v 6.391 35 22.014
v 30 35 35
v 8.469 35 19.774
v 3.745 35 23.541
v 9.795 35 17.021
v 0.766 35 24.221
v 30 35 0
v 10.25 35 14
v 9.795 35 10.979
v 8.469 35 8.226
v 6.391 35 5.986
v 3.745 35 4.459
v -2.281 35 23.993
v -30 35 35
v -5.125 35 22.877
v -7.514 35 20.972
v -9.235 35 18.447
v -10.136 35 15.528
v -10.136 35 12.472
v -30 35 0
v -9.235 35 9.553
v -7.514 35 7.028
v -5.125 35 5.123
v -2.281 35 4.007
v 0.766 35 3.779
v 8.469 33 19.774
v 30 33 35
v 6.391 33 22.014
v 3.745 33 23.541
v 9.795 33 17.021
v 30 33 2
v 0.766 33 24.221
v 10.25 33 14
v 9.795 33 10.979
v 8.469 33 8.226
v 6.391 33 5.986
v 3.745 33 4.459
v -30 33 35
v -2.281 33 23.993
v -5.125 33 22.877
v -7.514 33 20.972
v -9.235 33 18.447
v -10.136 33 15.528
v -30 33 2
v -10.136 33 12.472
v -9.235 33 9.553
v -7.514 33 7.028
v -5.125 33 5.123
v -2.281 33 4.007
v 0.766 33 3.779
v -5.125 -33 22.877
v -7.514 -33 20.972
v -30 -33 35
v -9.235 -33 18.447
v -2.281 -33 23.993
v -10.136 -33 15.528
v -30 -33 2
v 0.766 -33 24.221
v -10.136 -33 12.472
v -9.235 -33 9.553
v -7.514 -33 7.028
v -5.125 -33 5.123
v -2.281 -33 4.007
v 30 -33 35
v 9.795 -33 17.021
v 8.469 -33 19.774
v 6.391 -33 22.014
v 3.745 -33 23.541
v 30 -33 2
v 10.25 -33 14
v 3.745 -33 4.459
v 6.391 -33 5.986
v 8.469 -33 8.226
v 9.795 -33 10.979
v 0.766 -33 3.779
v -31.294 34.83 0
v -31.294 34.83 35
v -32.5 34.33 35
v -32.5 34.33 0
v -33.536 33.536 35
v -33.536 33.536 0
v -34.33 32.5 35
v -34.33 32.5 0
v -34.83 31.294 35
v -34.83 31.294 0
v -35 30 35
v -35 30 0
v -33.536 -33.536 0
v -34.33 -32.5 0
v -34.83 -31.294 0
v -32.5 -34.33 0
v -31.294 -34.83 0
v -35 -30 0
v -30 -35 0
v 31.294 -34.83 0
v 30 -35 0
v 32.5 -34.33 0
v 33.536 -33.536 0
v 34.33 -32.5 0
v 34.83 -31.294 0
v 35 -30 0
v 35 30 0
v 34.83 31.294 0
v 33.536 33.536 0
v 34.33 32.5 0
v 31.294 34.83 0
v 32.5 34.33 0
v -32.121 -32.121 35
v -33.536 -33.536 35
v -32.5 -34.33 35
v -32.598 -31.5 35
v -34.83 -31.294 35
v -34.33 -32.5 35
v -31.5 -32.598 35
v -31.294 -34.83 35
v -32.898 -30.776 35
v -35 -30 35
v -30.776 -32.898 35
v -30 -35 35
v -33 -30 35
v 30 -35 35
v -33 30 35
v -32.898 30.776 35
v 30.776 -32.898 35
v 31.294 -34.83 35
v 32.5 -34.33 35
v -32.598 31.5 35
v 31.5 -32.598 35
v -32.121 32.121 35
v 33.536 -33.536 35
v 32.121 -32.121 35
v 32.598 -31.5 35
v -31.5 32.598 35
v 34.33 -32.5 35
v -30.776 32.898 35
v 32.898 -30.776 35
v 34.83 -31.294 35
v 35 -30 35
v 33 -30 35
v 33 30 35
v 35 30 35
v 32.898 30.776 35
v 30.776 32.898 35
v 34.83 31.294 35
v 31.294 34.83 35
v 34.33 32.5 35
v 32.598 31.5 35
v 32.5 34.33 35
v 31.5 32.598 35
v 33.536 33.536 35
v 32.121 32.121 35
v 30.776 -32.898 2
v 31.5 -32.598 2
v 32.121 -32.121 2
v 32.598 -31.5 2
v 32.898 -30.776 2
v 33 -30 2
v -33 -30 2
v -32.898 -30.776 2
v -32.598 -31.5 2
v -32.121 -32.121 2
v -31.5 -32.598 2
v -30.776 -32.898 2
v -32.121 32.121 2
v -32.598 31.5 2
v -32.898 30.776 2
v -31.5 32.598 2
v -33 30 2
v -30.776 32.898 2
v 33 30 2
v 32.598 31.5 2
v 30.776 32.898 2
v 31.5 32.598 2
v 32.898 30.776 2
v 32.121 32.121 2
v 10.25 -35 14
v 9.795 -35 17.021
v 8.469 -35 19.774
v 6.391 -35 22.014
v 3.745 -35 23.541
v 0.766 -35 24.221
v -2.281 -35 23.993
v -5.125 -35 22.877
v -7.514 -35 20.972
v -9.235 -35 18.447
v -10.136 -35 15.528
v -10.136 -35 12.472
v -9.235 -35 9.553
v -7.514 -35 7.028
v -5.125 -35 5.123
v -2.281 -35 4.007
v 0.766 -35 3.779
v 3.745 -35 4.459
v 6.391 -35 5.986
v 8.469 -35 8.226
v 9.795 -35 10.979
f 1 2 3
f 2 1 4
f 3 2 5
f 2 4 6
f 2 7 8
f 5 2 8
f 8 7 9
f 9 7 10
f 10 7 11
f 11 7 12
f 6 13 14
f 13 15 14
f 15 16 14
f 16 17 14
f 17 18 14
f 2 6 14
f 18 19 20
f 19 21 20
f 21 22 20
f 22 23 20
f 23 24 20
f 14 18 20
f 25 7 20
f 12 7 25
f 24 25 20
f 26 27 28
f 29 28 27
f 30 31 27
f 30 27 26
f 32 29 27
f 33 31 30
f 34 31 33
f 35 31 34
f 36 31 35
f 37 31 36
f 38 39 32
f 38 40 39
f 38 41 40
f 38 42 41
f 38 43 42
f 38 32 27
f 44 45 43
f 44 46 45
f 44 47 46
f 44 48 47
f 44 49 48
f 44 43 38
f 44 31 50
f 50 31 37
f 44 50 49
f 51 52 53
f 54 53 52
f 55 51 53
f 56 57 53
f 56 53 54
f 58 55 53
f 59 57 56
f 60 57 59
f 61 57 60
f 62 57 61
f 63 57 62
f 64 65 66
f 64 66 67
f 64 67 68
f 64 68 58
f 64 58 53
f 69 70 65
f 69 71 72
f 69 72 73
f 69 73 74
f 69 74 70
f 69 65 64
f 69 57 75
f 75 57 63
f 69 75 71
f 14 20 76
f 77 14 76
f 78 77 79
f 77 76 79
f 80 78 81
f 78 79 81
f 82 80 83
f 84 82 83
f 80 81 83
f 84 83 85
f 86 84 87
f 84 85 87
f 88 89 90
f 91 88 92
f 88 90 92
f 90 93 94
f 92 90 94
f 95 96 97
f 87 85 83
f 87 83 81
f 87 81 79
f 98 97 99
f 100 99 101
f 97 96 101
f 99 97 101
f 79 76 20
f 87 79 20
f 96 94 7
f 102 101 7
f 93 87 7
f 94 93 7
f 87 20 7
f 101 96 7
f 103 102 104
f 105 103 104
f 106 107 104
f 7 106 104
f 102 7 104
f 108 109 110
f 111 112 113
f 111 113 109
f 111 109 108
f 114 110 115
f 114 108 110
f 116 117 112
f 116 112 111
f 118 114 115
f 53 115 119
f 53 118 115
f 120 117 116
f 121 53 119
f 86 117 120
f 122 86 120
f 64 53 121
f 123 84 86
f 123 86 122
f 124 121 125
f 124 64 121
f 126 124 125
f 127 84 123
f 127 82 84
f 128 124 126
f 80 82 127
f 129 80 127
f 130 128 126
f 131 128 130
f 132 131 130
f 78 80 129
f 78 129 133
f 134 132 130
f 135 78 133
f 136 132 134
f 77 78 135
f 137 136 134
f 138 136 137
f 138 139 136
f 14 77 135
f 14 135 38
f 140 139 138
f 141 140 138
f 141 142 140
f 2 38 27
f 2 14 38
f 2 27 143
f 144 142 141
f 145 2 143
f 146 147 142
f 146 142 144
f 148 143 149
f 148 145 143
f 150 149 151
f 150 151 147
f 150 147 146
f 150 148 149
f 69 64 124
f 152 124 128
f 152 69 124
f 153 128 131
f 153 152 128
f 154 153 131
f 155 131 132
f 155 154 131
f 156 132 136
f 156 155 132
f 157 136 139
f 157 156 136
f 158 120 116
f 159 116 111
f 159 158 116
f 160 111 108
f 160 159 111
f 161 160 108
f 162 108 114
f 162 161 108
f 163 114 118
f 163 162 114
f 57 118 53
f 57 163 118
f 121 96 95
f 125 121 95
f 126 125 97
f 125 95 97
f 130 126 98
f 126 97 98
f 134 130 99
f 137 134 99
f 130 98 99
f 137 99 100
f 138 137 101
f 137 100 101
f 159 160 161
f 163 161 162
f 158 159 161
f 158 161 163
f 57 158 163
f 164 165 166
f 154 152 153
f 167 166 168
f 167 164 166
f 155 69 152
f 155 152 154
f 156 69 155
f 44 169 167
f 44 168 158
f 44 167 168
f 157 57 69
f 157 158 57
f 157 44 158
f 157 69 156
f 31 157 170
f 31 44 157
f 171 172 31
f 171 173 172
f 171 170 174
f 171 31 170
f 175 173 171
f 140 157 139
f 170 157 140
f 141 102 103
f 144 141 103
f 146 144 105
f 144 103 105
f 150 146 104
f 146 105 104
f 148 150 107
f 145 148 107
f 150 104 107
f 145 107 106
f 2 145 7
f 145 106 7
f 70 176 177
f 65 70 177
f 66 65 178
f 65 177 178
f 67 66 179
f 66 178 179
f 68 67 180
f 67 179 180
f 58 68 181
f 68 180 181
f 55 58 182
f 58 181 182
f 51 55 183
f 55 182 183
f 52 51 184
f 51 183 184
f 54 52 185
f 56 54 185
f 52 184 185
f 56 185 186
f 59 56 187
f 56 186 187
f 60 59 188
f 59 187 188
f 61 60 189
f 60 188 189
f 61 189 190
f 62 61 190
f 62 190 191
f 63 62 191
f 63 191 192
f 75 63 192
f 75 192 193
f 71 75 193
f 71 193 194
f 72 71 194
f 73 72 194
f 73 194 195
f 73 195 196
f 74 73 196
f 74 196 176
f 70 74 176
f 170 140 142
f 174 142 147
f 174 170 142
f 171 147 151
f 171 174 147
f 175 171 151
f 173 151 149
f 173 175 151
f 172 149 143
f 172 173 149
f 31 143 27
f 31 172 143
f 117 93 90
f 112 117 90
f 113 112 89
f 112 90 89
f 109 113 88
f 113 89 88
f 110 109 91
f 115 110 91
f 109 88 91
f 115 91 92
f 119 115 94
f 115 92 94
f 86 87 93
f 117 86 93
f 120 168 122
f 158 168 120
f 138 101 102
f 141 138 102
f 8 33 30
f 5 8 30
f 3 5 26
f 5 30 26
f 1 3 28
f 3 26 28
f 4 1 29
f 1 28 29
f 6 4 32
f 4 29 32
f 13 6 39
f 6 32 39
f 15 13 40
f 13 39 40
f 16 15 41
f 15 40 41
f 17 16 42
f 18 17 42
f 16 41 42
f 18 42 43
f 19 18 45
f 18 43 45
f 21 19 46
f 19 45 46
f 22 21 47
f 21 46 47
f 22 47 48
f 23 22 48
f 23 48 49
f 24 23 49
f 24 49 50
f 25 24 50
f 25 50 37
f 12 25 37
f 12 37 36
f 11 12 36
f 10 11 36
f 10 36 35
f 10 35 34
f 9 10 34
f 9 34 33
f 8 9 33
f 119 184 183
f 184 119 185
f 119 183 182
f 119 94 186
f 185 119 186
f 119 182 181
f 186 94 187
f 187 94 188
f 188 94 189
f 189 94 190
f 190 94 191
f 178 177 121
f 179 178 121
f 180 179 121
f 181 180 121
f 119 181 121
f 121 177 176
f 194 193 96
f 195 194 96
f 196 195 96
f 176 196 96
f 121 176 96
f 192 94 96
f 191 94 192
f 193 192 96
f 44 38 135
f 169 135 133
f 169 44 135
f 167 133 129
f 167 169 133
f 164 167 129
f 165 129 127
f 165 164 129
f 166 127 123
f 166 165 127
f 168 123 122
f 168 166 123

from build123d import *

# Parameters (mm, degrees)
AUFSATZ_LINEAR_AUSTRAGEN1_DEPTH = 35
WANDUNG1_T                      = -2
SKIZZE2_R                       = 10.25
SCHNITT_LINEAR_AUSTRAGEN1_DEPTH = 71


with BuildPart() as part:
    # Skizze1 → Aufsatz-Linear austragen1 (new body)
    with BuildSketch(Plane.XY):
        with BuildLine():
            Line((-30, -35), (30, -35))
            ThreePointArc((30, -35), (33.535533906, -33.535533906), (35, -30))
            Line((35, -30), (35, 30))
            ThreePointArc((35, 30), (33.535533906, 33.535533906), (30, 35))
            Line((30, 35), (-30, 35))
            ThreePointArc((-30, 35), (-33.535533906, 33.535533906), (-35, 30))
            Line((-35, 30), (-35, -30))
            ThreePointArc((-35, -30), (-33.535533906, -33.535533906), (-30, -35))
        make_face()
    extrude(amount=AUFSATZ_LINEAR_AUSTRAGEN1_DEPTH)

    # Wandung1
    wandung1_openings = [part.faces().sort_by_distance(p)[0] for p in [
        (0, 0, 35),
    ]]
    offset(amount=WANDUNG1_T, openings=wandung1_openings, kind=Kind.INTERSECTION)

    # Skizze2 → Schnitt-Linear austragen1 (cut, through all)
    with BuildSketch(Plane.XZ.offset(35)):
        with Locations((0, 14)):
            Circle(SKIZZE2_R)
    extrude(amount=-SCHNITT_LINEAR_AUSTRAGEN1_DEPTH, mode=Mode.SUBTRACT)


solid = part.part
